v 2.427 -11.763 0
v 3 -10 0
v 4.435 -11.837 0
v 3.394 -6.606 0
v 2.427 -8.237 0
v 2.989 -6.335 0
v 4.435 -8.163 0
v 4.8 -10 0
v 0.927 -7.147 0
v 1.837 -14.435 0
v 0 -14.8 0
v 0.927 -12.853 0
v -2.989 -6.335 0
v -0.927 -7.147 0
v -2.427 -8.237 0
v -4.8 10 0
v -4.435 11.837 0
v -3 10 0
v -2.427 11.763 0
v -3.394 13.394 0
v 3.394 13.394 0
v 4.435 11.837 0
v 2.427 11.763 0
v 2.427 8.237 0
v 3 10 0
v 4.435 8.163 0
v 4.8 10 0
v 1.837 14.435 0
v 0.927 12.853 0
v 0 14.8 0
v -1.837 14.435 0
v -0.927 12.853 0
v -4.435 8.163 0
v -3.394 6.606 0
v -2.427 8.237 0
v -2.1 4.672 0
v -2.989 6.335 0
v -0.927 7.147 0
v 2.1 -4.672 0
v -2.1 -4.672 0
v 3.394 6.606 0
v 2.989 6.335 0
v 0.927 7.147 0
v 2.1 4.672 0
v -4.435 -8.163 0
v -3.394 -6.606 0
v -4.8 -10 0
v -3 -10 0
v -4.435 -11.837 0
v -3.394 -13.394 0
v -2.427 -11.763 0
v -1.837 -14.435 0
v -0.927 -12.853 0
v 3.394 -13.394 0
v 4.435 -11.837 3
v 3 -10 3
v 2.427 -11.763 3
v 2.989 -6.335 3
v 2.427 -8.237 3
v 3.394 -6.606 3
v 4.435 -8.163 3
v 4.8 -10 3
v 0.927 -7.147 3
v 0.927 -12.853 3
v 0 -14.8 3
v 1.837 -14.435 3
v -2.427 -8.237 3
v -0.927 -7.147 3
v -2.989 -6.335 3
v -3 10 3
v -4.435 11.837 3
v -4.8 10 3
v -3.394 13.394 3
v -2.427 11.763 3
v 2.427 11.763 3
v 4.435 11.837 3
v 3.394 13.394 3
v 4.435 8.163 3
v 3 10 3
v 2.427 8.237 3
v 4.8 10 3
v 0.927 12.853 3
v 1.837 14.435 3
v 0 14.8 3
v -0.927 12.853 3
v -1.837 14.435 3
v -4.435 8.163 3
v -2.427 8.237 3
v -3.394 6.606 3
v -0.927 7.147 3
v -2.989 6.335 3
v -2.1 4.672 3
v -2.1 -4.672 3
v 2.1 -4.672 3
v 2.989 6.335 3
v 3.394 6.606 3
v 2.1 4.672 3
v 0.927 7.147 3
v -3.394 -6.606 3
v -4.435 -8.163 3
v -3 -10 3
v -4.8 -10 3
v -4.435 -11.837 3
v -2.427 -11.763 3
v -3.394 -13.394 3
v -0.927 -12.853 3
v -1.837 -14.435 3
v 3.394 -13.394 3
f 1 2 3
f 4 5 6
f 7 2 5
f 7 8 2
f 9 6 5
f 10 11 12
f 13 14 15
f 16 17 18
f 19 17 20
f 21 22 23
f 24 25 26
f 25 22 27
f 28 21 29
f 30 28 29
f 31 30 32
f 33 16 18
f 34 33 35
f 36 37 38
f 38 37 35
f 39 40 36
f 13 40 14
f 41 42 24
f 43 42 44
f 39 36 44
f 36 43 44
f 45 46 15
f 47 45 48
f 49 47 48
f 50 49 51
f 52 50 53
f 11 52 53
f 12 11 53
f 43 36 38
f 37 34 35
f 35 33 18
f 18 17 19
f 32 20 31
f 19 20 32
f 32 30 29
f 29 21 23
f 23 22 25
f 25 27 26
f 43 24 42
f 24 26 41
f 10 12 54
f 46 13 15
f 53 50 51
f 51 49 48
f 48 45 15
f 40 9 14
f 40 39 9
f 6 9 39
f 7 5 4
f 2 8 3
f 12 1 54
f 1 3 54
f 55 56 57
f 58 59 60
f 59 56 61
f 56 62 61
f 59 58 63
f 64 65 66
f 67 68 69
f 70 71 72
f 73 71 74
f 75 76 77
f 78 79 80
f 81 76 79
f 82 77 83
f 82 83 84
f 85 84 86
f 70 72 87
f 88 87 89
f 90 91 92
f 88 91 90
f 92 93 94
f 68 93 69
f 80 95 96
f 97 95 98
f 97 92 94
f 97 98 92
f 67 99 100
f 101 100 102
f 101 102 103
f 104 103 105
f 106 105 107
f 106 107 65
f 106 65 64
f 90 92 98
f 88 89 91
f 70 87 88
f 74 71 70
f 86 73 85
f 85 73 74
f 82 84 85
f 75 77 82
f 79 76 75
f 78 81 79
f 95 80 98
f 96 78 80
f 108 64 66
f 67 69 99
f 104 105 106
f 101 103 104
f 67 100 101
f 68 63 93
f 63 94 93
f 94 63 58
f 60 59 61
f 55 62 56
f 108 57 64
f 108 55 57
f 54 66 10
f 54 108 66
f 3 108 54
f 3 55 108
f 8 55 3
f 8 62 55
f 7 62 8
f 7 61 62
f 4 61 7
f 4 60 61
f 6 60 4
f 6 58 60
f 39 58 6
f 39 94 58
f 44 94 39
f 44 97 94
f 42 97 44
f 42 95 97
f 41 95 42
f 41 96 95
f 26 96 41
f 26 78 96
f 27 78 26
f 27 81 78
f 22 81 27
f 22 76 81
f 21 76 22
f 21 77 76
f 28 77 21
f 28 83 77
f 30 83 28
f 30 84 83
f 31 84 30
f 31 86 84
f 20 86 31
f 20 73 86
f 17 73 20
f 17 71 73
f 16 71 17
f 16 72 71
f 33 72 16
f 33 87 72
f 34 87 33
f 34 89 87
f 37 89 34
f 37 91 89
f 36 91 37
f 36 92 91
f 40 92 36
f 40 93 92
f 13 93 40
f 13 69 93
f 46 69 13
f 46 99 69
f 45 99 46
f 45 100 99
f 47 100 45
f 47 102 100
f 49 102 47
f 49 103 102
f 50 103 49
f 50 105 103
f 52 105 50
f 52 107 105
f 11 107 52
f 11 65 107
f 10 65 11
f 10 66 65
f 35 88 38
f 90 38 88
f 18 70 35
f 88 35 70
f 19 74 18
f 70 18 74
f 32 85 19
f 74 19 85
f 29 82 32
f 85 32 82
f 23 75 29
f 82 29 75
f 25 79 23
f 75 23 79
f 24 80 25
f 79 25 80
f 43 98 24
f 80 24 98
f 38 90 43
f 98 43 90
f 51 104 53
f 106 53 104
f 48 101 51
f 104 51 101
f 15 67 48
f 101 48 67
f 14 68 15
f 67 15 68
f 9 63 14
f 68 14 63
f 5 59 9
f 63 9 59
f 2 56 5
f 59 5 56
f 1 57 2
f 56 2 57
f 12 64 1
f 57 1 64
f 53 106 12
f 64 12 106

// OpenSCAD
// file: arm_holder.scad
module arm_holder(external_radius, internal_radius, width, tolerence)
{
    union()
    {
        scale(v = [1, 1, 2]) union() {
            difference() {
                cube(size = [external_radius, external_radius, width]);
                translate(v = [0, 0, width/2]) cylinder(h = width*2, r = external_radius, center = true);
            }
            translate(v = [0, external_radius*2, 0]) mirror(v = [0, 1, 0])  difference() {
                cube(size = [external_radius, external_radius, width]);
                translate(v = [0, 0, width/2]) cylinder(h = width*2, r = external_radius, center = true);
            }
        }

        difference()
        {
            translate(v = [0, 0, width/2]) cylinder(h = width, r = external_radius, center = true);
            cylinder(h = 13, r = internal_radius, center = true);
        }
    }
}


rotate(a = 90, v = [0, 1, 0]) arm_holder(5, 3, 4, .1);
// file: arm_pins.scad
use <arm_holder.scad>

module arm_pin(height, radius, hat_radius)
{
    difference()
    {
        union()
        {
            cylinder(h = height, r = radius, center = true);
            translate(v = [ 0, 0, -height / 2 - 1 ]) cylinder(h = 2, r = hat_radius, center = true);
        }
        cylinder(h = 20, r = 1.4, center = true);
        translate(v = [ -2, -2, 2 ]) cube(size = 4.2, center = true);
        translate(v = [ 2, 2, 2 ]) cube(size = 4.2, center = true);
    }
}

arm_pin(3.5, 2.7, 3.7);
// main file
use <arm_pins.scad>
use <arm_holder.scad>

module link(lenght, external_radius, internal_radius, width)
{
    linear_extrude(height = width)
    {
        difference() {
            offset(r=-2) {
                offset(delta=2) {
                    union() {
                        translate(v = [0, -lenght/2, 0]) circle(r = external_radius+2);
                        translate(v = [0, lenght/2, 0])circle(r = external_radius+2);
                        square(size = [external_radius*1.5, lenght], center=true);
                    }
                    circle(r = 2);
                }
            }
            union() {
                translate(v = [0, -lenght/2, 0]) circle(r = internal_radius);
                translate(v = [0, lenght/2, 0]) circle(r = internal_radius);
            }
        }
    } 
}

rotate(a = 90, v = [1, 0, 0]) union() 
{
    !link(20, 2.8, 3, 3)
    link(20, 2.8, 3, 3);
    translate(v = [0, -20, 2]) arm_pin(5, 2.7);
    translate(v = [0, -20, 7]) rotate(a = 180, v = [1, 0, 0])  rotate(a = 90, v = [0,0,1]) arm_holder(5, 3, 3.5, .1);
}
